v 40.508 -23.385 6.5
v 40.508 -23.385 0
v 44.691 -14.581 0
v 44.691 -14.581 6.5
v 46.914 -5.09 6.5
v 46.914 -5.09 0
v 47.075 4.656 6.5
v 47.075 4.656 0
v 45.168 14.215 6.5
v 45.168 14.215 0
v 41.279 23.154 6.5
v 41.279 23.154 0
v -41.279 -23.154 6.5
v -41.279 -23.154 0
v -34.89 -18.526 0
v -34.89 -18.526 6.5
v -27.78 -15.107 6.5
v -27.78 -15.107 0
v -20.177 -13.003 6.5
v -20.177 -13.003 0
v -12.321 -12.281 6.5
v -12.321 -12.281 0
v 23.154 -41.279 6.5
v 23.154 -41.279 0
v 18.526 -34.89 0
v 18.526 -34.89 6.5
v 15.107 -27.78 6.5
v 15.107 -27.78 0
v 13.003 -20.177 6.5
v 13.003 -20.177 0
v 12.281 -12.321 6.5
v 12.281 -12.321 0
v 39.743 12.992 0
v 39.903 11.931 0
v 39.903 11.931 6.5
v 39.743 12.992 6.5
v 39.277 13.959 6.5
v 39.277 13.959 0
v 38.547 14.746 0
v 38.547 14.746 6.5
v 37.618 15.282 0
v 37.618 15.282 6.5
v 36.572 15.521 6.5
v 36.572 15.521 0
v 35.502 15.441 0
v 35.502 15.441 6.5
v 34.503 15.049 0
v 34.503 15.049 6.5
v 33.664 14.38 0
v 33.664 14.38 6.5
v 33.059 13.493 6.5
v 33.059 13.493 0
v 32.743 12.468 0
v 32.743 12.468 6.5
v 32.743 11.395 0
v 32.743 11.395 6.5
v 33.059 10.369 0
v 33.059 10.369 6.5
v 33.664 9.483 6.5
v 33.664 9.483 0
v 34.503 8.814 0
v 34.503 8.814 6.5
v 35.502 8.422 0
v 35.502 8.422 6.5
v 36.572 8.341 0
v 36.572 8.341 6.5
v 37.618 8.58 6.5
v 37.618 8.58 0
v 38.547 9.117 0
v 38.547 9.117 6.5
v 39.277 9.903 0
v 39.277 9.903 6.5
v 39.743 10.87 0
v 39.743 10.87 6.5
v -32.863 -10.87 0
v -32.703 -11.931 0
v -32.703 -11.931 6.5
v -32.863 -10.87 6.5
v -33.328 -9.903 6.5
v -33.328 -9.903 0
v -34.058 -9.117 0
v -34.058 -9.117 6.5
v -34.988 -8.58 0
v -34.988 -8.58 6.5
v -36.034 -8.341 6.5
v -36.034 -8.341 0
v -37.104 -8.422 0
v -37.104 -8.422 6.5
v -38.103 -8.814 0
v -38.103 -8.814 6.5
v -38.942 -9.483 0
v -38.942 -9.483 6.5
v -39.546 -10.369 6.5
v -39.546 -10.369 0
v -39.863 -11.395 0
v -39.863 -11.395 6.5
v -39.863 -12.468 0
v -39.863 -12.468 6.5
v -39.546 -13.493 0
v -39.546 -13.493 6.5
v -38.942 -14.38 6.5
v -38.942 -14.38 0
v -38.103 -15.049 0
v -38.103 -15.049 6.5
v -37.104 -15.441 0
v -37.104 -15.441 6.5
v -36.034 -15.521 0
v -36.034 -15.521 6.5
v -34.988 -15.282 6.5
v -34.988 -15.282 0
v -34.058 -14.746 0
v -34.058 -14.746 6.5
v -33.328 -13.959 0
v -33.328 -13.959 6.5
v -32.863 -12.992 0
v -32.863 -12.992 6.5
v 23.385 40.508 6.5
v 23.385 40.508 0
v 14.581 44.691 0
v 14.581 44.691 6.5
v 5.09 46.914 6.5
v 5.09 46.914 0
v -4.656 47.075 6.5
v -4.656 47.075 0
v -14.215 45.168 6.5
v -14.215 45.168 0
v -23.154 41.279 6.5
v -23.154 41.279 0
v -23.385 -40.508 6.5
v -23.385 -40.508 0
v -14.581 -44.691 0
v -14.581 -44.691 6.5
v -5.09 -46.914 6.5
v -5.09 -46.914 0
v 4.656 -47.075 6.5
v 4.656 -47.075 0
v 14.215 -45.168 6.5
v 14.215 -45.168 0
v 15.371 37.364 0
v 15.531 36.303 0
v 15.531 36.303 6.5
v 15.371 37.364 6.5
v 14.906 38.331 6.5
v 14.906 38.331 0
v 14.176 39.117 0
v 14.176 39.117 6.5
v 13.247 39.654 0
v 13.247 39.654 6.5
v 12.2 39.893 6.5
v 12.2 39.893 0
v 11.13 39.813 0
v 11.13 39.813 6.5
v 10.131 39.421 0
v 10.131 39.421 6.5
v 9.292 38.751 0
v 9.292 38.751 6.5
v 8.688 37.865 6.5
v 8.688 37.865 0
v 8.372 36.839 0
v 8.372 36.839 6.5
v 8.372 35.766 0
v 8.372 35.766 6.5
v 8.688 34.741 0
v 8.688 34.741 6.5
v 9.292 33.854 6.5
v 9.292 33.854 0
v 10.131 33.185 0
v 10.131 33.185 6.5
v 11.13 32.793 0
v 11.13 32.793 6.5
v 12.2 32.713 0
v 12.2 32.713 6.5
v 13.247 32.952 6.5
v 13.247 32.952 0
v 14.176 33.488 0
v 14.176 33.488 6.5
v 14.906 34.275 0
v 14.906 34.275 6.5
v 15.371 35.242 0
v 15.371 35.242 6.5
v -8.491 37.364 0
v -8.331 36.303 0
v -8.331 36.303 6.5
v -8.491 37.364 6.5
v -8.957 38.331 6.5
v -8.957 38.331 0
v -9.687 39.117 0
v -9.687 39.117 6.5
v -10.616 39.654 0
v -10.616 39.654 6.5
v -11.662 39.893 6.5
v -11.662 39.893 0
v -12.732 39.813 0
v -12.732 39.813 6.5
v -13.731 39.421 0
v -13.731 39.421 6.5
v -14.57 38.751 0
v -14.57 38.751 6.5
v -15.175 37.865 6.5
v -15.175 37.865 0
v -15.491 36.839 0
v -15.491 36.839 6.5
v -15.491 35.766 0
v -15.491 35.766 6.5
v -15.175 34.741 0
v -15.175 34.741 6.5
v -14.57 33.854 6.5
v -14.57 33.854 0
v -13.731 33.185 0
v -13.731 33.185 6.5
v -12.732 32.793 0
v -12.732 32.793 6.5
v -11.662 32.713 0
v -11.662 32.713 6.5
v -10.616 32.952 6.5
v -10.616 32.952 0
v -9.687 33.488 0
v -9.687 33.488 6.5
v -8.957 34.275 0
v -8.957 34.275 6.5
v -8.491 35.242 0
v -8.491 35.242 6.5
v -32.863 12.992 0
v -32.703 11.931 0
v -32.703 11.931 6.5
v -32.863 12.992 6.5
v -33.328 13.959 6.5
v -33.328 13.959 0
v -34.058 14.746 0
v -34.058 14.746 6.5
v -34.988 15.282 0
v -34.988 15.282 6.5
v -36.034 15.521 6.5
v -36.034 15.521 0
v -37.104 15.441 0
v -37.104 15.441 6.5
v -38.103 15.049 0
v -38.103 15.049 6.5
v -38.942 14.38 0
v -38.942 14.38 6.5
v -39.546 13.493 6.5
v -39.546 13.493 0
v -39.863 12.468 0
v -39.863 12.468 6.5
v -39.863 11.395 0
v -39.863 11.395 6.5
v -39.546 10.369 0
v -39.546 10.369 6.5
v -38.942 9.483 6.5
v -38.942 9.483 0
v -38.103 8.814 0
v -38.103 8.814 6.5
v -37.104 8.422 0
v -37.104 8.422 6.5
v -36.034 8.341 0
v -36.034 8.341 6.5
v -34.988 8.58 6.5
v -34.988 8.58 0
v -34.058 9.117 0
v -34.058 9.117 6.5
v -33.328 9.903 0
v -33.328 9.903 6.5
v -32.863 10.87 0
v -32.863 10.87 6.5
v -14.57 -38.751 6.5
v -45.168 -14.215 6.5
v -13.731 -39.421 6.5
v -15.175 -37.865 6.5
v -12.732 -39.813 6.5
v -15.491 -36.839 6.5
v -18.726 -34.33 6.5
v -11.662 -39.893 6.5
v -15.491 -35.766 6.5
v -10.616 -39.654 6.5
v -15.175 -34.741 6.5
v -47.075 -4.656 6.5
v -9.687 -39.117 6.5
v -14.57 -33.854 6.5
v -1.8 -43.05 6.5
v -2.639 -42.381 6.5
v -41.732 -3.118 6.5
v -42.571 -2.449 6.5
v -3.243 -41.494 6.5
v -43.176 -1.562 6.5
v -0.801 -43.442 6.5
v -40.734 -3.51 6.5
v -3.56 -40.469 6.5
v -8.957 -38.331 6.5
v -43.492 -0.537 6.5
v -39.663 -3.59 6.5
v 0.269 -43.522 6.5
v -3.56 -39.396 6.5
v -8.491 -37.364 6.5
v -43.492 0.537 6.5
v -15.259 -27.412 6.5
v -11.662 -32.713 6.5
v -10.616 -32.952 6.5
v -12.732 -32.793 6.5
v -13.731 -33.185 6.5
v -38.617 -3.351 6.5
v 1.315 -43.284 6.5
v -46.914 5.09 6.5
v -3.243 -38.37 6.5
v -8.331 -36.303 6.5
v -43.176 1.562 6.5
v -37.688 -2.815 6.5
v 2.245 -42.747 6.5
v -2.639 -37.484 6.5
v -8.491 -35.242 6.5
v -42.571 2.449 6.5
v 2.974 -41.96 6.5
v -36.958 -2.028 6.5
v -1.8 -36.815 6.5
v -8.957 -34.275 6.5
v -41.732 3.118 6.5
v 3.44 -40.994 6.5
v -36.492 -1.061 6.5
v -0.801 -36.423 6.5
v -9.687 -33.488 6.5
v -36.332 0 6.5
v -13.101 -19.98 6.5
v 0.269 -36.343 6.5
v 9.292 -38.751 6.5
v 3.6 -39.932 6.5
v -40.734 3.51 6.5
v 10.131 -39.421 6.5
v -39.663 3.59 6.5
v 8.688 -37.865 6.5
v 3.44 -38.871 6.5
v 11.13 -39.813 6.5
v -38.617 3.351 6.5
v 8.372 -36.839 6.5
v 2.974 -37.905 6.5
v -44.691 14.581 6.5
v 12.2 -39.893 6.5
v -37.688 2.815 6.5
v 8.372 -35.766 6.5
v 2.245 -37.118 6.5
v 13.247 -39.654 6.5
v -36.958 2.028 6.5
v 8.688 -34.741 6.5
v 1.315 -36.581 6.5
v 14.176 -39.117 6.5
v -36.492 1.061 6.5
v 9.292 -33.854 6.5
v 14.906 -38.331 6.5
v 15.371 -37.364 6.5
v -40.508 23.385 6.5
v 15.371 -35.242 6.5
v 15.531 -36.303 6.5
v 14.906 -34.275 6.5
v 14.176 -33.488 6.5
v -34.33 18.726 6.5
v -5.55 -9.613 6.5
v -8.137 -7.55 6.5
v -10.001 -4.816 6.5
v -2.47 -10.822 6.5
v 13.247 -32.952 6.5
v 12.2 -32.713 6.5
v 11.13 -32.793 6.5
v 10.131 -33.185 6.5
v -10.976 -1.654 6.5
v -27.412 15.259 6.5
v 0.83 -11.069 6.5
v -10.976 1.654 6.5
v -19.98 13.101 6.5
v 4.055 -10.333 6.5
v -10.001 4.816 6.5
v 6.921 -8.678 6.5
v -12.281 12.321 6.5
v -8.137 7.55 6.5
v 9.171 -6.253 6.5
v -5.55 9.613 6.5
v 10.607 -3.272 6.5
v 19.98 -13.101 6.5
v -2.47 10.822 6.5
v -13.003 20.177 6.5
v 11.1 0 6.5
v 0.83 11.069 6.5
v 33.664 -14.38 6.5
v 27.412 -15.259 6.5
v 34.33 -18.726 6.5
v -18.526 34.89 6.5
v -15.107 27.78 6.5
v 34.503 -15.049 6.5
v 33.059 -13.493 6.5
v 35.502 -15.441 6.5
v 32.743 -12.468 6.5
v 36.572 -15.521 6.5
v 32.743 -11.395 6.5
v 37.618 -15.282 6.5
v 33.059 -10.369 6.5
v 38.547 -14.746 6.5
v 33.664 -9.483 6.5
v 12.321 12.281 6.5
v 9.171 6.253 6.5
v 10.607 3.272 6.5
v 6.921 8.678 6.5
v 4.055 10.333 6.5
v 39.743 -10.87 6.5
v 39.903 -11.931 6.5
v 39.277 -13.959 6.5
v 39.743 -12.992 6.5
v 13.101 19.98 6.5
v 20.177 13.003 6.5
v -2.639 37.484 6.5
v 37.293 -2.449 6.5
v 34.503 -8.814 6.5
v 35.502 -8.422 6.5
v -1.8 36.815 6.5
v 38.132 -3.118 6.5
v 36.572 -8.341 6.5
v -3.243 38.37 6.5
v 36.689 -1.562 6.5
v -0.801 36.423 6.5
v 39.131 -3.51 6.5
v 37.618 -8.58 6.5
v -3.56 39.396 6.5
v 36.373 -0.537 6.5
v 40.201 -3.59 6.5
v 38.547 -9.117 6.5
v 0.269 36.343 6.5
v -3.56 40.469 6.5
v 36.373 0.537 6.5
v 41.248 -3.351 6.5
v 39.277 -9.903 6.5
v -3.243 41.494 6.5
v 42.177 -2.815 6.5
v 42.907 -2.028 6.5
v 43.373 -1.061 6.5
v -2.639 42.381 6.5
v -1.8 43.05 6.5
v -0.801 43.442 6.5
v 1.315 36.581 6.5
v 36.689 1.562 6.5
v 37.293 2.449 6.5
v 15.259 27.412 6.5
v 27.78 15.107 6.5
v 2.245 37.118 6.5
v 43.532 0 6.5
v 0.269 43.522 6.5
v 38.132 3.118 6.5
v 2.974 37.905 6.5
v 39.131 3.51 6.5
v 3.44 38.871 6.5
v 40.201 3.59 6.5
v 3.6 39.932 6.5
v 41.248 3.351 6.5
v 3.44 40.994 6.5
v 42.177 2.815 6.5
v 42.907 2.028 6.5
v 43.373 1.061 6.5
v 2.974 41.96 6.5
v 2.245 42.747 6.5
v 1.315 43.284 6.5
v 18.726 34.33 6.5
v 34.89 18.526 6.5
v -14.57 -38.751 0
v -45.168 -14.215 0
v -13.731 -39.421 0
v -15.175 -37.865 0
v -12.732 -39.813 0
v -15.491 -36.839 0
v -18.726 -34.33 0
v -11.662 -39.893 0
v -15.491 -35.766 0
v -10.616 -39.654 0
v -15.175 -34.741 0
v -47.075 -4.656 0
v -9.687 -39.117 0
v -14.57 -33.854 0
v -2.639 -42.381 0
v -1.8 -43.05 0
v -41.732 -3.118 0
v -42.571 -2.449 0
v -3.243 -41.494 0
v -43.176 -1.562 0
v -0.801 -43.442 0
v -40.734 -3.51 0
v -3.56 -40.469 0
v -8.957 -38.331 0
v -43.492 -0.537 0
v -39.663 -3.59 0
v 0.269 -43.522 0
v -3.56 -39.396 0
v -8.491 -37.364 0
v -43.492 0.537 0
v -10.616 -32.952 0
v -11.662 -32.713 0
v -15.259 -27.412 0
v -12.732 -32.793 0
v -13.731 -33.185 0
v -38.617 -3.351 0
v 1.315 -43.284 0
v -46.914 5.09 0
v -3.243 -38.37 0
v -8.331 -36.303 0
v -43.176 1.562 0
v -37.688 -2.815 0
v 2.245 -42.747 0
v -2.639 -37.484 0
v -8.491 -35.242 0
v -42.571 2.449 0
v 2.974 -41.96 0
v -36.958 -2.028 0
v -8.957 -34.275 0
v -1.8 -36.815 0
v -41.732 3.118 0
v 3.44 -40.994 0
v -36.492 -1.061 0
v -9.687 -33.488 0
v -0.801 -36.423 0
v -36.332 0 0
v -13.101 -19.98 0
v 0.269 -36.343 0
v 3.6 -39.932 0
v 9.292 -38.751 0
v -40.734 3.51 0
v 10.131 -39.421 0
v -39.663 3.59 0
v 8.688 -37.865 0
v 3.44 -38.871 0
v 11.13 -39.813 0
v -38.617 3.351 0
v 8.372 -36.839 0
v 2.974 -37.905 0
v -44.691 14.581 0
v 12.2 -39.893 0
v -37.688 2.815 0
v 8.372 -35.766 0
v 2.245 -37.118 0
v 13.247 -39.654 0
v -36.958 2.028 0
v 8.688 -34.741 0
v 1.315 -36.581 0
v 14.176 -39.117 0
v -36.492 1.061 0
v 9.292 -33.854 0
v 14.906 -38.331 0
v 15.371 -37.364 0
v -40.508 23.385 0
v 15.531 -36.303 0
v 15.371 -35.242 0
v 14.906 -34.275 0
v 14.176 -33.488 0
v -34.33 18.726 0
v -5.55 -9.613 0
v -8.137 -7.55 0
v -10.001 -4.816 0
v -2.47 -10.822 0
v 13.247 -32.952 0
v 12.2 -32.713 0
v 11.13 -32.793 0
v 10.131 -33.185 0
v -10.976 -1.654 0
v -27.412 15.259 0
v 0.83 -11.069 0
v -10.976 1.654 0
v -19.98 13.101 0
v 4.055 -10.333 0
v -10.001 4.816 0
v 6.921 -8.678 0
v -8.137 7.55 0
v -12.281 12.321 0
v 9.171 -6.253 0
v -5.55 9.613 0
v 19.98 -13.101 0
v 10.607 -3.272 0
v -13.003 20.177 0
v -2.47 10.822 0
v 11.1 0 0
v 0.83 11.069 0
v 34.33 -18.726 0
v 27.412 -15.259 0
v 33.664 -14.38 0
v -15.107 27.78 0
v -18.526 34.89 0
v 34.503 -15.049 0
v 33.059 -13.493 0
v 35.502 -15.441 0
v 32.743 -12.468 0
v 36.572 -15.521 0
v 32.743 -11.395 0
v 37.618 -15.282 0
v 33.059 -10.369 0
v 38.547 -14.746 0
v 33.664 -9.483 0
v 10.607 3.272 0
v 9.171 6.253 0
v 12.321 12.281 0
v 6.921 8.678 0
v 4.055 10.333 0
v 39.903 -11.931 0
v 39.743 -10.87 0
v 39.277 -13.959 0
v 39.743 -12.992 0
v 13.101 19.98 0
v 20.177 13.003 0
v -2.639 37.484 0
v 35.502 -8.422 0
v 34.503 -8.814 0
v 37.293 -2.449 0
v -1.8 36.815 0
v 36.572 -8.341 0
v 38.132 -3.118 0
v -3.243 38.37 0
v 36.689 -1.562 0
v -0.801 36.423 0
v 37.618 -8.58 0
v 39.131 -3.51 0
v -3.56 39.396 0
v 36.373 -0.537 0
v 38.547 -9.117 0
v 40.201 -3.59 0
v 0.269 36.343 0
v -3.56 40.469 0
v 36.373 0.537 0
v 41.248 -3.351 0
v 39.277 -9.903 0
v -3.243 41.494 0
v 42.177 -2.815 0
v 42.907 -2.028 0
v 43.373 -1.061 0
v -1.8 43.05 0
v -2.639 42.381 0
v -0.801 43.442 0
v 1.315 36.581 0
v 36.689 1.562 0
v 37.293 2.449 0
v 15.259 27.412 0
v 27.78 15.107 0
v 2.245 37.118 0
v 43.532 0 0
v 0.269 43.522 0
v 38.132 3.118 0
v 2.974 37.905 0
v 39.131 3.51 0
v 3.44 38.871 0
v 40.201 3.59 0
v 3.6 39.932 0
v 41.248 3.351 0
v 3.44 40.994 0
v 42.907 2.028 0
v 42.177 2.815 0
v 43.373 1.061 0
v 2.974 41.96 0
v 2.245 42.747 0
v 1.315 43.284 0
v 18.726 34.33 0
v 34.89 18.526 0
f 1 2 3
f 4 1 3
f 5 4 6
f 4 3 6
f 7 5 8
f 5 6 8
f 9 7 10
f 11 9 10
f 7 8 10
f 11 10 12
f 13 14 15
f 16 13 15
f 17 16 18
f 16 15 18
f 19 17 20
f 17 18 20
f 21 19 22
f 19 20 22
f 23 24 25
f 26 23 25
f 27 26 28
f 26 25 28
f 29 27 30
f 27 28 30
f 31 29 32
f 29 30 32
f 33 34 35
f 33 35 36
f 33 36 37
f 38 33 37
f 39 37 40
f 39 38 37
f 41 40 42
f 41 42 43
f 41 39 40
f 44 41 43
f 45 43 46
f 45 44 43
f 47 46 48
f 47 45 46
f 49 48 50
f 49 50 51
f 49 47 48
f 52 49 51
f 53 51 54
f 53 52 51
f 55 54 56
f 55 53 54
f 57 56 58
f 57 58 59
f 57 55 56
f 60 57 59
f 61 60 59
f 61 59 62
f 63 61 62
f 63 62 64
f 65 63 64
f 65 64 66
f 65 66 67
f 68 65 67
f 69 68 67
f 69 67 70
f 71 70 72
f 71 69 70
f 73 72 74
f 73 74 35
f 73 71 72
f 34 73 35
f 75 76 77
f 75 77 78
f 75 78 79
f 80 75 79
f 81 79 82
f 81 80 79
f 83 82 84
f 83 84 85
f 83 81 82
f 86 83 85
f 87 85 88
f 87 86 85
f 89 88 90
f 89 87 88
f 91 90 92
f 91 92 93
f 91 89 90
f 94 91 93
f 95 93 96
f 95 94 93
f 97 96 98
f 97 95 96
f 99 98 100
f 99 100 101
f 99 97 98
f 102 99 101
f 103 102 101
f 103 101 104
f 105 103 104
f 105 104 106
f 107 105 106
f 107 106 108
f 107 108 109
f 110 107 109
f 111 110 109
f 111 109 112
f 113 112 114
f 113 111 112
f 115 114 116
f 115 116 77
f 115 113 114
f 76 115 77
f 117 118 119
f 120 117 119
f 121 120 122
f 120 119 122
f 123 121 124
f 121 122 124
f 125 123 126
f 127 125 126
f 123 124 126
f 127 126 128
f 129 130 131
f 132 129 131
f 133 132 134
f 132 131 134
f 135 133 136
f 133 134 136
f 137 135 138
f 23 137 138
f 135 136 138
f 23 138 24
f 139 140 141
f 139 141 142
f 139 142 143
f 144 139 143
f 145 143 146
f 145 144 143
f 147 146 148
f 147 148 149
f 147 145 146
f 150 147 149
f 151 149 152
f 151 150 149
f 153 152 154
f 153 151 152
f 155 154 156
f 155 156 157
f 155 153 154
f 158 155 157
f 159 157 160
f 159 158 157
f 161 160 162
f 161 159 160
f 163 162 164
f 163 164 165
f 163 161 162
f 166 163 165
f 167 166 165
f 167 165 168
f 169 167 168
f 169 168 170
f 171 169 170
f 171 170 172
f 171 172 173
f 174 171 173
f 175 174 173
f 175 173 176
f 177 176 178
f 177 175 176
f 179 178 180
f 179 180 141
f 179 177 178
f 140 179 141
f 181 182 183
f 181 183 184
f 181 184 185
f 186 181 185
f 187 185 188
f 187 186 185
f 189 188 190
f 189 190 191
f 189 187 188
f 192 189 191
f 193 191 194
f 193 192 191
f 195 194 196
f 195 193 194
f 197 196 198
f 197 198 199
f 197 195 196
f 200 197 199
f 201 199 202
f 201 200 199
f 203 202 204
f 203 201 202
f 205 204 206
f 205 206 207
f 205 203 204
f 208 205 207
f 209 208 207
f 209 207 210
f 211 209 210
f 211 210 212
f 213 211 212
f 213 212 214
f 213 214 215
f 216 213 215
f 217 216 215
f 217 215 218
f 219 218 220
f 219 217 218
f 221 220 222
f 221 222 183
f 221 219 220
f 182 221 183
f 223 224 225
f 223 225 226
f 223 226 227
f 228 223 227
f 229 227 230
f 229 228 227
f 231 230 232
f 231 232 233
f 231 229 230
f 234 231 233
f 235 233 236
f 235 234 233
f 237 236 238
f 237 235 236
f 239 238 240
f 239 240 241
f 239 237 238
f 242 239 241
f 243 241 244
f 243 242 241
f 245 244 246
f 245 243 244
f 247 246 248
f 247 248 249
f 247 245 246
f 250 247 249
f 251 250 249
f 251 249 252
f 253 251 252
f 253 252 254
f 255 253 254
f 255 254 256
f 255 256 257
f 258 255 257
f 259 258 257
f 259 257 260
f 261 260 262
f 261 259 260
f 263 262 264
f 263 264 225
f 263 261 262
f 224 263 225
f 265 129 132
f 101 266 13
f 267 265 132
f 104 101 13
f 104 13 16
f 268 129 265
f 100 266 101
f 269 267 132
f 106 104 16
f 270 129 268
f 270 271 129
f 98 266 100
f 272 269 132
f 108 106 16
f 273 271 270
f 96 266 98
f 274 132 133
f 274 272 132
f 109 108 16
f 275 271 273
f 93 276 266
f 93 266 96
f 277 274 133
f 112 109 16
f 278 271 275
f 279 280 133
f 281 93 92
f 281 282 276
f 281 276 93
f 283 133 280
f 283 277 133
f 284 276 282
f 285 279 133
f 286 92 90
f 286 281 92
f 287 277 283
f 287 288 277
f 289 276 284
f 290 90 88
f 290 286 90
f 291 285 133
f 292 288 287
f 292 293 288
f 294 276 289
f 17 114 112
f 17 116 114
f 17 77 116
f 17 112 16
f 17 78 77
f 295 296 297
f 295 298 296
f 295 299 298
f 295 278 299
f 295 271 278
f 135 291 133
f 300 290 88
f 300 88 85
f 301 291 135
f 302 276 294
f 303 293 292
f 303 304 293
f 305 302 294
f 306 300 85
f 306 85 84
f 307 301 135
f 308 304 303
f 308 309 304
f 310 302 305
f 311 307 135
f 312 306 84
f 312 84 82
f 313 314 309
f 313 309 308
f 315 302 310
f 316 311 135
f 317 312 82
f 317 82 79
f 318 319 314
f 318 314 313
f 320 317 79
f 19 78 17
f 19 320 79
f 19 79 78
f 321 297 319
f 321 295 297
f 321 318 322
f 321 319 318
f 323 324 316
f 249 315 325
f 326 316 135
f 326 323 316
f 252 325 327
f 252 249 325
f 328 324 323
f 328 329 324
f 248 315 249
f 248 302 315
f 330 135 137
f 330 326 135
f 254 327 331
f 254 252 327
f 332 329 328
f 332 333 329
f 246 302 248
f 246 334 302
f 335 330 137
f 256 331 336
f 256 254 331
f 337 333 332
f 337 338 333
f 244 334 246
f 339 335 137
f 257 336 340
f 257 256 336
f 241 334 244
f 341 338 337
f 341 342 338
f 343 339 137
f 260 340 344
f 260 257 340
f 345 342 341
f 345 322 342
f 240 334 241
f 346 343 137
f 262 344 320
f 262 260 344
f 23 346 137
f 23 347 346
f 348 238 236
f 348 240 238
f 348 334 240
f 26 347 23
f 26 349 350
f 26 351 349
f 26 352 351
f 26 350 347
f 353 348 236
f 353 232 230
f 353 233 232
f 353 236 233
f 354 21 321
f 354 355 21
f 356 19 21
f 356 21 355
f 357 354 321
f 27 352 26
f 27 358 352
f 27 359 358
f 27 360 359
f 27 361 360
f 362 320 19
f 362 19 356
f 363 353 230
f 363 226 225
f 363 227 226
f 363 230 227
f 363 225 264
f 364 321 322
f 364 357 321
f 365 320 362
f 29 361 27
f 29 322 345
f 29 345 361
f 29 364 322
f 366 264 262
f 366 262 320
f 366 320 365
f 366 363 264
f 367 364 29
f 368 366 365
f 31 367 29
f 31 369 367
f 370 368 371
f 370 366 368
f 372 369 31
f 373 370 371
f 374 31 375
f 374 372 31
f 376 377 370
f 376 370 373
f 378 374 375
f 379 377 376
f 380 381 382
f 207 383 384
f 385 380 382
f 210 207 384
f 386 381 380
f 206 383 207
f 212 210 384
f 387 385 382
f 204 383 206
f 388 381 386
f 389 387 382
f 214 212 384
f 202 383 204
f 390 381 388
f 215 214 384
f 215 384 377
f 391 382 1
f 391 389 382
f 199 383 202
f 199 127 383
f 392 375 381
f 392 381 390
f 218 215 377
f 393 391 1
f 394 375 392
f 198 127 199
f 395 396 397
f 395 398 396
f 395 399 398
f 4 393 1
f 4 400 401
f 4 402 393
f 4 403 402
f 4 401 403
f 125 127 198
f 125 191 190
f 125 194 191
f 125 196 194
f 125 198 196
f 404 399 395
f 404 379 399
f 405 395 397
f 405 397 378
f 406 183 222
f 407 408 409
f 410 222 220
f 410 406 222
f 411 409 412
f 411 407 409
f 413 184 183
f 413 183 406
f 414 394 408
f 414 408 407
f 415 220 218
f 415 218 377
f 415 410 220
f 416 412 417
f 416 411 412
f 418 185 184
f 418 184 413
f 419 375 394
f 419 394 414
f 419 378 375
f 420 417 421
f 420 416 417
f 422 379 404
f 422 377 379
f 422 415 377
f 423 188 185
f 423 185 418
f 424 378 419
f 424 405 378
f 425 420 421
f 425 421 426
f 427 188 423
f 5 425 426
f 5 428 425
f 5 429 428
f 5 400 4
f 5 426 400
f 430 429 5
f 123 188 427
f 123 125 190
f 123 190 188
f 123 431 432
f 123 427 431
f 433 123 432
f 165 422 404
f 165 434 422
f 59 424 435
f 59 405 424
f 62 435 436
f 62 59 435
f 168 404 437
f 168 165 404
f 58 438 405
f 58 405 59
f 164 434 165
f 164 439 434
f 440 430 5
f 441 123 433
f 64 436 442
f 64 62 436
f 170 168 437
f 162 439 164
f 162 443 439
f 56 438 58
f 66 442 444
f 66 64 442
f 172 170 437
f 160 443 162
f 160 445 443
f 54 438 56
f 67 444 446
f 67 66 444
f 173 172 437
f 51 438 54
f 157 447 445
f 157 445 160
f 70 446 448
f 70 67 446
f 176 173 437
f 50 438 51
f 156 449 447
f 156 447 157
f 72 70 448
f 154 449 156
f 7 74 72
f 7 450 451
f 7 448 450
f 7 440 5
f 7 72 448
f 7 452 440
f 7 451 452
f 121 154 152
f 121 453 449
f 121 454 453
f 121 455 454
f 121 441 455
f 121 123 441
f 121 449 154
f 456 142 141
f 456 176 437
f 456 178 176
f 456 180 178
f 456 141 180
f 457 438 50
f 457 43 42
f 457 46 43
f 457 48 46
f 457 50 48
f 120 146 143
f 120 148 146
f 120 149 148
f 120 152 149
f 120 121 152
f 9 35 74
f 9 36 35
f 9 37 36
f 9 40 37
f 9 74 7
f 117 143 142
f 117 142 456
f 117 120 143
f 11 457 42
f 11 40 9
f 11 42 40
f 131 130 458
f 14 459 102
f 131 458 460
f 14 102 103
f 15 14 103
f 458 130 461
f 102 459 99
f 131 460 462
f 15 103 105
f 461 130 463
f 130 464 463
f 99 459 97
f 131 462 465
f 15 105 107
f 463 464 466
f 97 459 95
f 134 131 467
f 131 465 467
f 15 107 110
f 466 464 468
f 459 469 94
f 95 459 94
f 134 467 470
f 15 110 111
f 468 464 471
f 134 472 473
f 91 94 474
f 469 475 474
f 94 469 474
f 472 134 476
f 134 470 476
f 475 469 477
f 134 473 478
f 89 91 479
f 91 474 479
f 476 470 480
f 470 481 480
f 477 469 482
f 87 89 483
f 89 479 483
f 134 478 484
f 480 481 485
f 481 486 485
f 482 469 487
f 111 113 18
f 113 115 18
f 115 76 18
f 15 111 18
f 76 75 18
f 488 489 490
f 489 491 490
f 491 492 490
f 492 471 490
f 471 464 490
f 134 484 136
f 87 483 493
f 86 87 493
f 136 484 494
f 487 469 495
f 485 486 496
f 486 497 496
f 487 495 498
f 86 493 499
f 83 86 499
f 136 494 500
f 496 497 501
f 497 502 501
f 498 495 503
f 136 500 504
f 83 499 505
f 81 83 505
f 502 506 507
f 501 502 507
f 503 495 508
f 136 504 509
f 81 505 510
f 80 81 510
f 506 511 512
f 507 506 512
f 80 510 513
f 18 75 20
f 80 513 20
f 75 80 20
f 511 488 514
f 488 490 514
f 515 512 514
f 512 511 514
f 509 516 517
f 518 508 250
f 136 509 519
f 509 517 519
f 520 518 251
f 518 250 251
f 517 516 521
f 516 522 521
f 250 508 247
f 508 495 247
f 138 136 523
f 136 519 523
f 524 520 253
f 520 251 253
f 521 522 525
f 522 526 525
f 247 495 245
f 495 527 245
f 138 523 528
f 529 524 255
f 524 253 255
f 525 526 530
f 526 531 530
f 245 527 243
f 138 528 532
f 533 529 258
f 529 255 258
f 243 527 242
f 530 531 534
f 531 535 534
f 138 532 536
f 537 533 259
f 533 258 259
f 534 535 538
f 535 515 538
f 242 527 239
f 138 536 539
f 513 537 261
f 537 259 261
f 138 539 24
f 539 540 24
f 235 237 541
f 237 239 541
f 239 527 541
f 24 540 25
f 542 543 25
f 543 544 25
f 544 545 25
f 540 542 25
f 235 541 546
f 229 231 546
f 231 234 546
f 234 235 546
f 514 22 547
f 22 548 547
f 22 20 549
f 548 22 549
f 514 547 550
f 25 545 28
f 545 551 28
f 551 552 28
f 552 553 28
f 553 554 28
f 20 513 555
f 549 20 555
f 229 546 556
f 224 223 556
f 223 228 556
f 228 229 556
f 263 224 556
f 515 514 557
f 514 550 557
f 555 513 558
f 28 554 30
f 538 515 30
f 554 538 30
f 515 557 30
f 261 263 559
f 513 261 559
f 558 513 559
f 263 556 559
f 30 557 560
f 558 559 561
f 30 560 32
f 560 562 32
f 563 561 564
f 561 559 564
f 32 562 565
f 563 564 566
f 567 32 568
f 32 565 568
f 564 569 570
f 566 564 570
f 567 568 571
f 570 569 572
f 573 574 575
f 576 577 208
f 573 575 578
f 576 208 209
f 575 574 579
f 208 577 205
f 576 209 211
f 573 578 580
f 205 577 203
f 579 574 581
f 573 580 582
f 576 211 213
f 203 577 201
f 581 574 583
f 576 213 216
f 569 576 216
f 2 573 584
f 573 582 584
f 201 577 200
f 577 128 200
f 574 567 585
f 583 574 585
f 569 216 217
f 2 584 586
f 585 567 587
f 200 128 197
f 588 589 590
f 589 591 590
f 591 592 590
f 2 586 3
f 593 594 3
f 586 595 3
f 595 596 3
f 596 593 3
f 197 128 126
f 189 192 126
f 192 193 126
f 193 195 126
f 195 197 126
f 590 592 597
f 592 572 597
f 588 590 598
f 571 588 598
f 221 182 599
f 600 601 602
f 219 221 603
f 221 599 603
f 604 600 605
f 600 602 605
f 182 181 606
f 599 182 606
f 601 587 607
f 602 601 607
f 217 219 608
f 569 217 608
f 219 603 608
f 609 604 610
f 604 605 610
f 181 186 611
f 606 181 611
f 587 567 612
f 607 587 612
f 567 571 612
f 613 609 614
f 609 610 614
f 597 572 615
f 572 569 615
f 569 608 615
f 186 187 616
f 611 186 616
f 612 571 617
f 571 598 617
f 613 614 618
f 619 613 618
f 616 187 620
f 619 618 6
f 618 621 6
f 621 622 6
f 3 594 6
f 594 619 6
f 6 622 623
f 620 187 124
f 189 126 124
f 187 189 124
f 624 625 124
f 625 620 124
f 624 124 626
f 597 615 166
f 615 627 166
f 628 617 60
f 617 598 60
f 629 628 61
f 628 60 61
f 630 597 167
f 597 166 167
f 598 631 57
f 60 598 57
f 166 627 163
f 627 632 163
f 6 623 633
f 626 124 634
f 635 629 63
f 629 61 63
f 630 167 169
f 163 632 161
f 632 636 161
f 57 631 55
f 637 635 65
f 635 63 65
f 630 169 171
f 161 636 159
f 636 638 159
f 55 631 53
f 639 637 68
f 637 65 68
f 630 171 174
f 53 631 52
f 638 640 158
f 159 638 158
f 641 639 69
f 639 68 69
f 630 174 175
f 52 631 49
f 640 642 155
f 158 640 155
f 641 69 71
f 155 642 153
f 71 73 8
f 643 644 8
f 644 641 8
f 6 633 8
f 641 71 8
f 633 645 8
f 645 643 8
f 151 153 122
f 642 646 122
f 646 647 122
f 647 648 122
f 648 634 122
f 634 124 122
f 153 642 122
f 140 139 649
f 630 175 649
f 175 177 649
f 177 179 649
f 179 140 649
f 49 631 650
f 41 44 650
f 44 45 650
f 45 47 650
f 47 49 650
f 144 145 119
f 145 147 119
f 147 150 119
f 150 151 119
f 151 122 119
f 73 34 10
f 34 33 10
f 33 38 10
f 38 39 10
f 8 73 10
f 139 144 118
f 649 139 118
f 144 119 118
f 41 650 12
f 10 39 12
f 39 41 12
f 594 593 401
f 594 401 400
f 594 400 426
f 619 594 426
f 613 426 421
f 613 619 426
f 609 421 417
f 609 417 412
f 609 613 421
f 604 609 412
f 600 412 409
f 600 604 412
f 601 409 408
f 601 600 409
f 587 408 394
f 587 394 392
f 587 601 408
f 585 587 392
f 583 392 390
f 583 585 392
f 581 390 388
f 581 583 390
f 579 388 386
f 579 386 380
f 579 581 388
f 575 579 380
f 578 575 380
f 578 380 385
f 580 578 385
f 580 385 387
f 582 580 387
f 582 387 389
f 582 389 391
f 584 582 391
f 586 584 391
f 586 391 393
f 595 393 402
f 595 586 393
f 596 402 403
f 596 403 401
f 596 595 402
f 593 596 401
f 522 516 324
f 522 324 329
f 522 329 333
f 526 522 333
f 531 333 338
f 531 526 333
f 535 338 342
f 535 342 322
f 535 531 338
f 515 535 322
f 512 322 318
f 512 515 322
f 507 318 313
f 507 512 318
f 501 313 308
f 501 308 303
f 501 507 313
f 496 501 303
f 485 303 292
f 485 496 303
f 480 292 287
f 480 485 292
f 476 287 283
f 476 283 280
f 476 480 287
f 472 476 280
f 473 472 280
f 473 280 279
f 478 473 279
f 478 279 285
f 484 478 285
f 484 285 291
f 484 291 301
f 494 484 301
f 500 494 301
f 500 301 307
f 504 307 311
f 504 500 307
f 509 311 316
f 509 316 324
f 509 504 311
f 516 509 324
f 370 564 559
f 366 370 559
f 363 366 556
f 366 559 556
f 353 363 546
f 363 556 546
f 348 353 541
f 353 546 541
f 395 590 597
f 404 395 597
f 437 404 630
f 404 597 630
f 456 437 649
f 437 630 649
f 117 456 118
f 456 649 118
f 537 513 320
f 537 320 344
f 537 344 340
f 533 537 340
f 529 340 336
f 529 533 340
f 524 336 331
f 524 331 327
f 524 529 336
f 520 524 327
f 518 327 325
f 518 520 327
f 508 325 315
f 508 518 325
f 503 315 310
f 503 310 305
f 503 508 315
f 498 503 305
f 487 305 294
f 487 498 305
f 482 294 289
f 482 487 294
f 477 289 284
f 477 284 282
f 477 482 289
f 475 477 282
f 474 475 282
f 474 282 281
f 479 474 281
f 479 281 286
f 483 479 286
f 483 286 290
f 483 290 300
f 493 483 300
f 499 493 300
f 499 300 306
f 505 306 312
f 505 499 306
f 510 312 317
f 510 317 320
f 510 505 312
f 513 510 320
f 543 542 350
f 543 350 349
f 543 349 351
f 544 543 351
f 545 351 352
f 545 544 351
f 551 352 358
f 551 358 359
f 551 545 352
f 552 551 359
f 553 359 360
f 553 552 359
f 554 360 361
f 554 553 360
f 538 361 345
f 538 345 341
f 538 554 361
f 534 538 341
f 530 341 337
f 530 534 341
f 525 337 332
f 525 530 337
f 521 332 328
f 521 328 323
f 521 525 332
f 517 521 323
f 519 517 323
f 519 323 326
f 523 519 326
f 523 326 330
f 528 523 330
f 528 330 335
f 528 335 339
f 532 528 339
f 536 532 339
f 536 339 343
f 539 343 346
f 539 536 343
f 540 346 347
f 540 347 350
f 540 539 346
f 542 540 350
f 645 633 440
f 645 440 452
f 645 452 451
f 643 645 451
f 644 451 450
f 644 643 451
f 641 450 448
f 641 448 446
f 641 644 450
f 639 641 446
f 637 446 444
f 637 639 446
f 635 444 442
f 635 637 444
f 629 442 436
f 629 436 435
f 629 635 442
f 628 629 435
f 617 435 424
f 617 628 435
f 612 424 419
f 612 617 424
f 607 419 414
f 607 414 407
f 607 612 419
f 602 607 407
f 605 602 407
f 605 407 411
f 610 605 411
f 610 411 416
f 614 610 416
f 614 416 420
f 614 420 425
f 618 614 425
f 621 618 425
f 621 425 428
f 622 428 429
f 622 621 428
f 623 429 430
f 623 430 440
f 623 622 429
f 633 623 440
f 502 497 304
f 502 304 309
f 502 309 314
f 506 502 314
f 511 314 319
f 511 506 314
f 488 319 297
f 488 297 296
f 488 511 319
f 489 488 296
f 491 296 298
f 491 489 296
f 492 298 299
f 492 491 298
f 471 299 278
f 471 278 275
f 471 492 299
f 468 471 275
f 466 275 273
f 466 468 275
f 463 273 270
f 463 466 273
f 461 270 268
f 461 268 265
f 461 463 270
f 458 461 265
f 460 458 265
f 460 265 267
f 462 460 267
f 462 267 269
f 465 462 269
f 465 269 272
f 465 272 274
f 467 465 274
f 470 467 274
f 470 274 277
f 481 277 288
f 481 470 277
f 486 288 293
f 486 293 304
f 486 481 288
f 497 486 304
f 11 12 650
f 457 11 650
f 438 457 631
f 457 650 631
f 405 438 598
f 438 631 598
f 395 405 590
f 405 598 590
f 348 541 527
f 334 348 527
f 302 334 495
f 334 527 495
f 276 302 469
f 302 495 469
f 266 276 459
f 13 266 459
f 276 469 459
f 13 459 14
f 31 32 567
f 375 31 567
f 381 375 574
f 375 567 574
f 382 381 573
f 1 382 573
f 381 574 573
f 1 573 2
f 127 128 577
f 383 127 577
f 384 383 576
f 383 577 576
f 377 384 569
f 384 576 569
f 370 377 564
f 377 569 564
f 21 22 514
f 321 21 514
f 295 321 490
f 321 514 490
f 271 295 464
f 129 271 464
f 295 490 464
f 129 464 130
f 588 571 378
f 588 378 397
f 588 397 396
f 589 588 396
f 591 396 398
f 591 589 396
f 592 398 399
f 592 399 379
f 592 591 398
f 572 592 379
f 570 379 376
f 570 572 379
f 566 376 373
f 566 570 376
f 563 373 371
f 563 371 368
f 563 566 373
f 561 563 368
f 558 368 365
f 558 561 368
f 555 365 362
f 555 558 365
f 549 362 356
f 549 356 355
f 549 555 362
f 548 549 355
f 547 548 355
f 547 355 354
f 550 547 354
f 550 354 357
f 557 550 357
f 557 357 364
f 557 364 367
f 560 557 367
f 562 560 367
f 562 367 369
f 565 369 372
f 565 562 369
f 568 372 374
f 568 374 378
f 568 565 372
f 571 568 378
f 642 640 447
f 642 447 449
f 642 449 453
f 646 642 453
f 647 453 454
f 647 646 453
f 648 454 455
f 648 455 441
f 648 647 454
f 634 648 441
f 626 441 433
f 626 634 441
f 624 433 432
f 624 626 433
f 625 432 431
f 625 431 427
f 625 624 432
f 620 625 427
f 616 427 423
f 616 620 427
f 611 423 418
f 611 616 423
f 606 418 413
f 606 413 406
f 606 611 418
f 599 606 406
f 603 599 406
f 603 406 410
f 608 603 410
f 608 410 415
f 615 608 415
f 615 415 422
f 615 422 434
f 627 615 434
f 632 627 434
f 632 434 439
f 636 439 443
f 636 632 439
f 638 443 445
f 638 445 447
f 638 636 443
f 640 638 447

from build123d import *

# Parameters (mm, degrees)
F0_R     = 3.6
F0_R_2   = 11.1
F1_DEPTH = 6.5


with BuildPart() as f1:
    # F0 (on Top) → F1 (new body)
    with BuildSketch(Plane.XY):
        with BuildLine():
            ThreePointArc((12.7551052803, 5.7712467707), (13.2775282625, 2.8640474895), (14, 0))
            ThreePointArc((14, 0), (13.6852379213, 2.951993062), (12.7551052803, 5.7712467707))
        make_face()
        with BuildLine():
            ThreePointArc((12.7551052803, 5.7712467707), (13.6852379213, 2.951993062), (14, 0))
            ThreePointArc((14, 0), (13.6843771554, -2.9559806947), (12.7517397332, -5.7786792415))
            ThreePointArc((12.7517397332, -5.7786792415), (12.3951684194, -9.0411992807), (12.2812401035, -12.3211688608))
            ThreePointArc((12.2812401035, -12.3211688608), (27.4116387343, -15.2593204889), (40.5084826052, -23.3854744583))
            ThreePointArc((40.5084826052, -23.3854744583), (47.2547330266, -0.2211970993), (41.2789992988, 23.1537092477))
            ThreePointArc((41.2789992988, 23.1537092477), (27.7803945414, 15.1065071257), (12.3211688608, 12.2812401035))
            ThreePointArc((12.3211688608, 12.2812401035), (12.4134187433, 9.0179300915), (12.7551052803, 5.7712467707))
        make_face()
        with Locations((36.3028572677, -11.9313535626)):
            Circle(F0_R, mode=Mode.SUBTRACT)
        with Locations((39.9324558712, 0)):
            Circle(F0_R, mode=Mode.SUBTRACT)
        with Locations((36.3028572677, 11.9313535626)):
            Circle(F0_R, mode=Mode.SUBTRACT)
        with BuildLine():
            ThreePointArc((12.7517397332, -5.7786792415), (13.2793138092, -2.8684824171), (14, 0))
            ThreePointArc((14, 0), (13.2775282625, 2.8640474895), (12.7551052803, 5.7712467707))
            ThreePointArc((12.7551052803, 5.7712467707), (9.9023791422, 9.8966098905), (5.7786792415, 12.7517397332))
            ThreePointArc((5.7786792415, 12.7517397332), (2.8684824171, 13.2793138092), (0, 14))
            ThreePointArc((0, 14), (-2.8640474895, 13.2775282625), (-5.7712467707, 12.7551052803))
            ThreePointArc((-5.7712467707, 12.7551052803), (-9.8966098905, 9.9023791422), (-12.7517397332, 5.7786792415))
            ThreePointArc((-12.7517397332, 5.7786792415), (-13.2793138092, 2.8684824171), (-14, 0))
            ThreePointArc((-14, 0), (-13.2775282625, -2.8640474895), (-12.7551052803, -5.7712467707))
            ThreePointArc((-12.7551052803, -5.7712467707), (-9.9023791422, -9.8966098905), (-5.7786792415, -12.7517397332))
            ThreePointArc((-5.7786792415, -12.7517397332), (-2.8684824171, -13.2793138092), (0, -14))
            ThreePointArc((0, -14), (2.8640474895, -13.2775282625), (5.7712467707, -12.7551052803))
            ThreePointArc((5.7712467707, -12.7551052803), (9.8966098905, -9.9023791422), (12.7517397332, -5.7786792415))
        make_face()
        Circle(F0_R_2, mode=Mode.SUBTRACT)
        with BuildLine():
            ThreePointArc((12.7517397332, -5.7786792415), (13.6843771554, -2.9559806947), (14, 0))
            ThreePointArc((14, 0), (13.2793138092, -2.8684824171), (12.7517397332, -5.7786792415))
        make_face()
        with BuildLine():
            ThreePointArc((5.7786792415, 12.7517397332), (9.9023791422, 9.8966098905), (12.7551052803, 5.7712467707))
            ThreePointArc((12.7551052803, 5.7712467707), (12.4134187433, 9.0179300915), (12.3211688608, 12.2812401035))
            ThreePointArc((12.3211688608, 12.2812401035), (9.0411992807, 12.3951684194), (5.7786792415, 12.7517397332))
        make_face()
        with BuildLine():
            ThreePointArc((12.2812401035, -12.3211688608), (12.3951684194, -9.0411992807), (12.7517397332, -5.7786792415))
            ThreePointArc((12.7517397332, -5.7786792415), (9.8966098905, -9.9023791422), (5.7712467707, -12.7551052803))
            ThreePointArc((5.7712467707, -12.7551052803), (9.0179300915, -12.4134187433), (12.2812401035, -12.3211688608))
        make_face()
        with BuildLine():
            ThreePointArc((0, 14), (2.8684824171, 13.2793138092), (5.7786792415, 12.7517397332))
            ThreePointArc((5.7786792415, 12.7517397332), (2.9559806947, 13.6843771554), (0, 14))
        make_face()
        with BuildLine():
            ThreePointArc((0, 14), (2.9559806947, 13.6843771554), (5.7786792415, 12.7517397332))
            ThreePointArc((5.7786792415, 12.7517397332), (9.0411992807, 12.3951684194), (12.3211688608, 12.2812401035))
            ThreePointArc((12.3211688608, 12.2812401035), (15.2593204889, 27.4116387343), (23.3854744583, 40.5084826052))
            ThreePointArc((23.3854744583, 40.5084826052), (0.2211970993, 47.2547330266), (-23.1537092477, 41.2789992988))
            ThreePointArc((-23.1537092477, 41.2789992988), (-15.1065071257, 27.7803945414), (-12.2812401035, 12.3211688608))
            ThreePointArc((-12.2812401035, 12.3211688608), (-9.0179300915, 12.4134187433), (-5.7712467707, 12.7551052803))
            ThreePointArc((-5.7712467707, 12.7551052803), (-2.951993062, 13.6852379213), (0, 14))
        make_face()
        with Locations((-11.9313535626, 36.3028572677)):
            Circle(F0_R, mode=Mode.SUBTRACT)
        with Locations((0, 39.9324558712)):
            Circle(F0_R, mode=Mode.SUBTRACT)
        with Locations((11.9313535626, 36.3028572677)):
            Circle(F0_R, mode=Mode.SUBTRACT)
        with BuildLine():
            ThreePointArc((12.2812401035, -12.3211688608), (9.0179300915, -12.4134187433), (5.7712467707, -12.7551052803))
            ThreePointArc((5.7712467707, -12.7551052803), (2.951993062, -13.6852379213), (0, -14))
            ThreePointArc((0, -14), (-2.9559806947, -13.6843771554), (-5.7786792415, -12.7517397332))
            ThreePointArc((-5.7786792415, -12.7517397332), (-9.0411992807, -12.3951684194), (-12.3211688608, -12.2812401035))
            ThreePointArc((-12.3211688608, -12.2812401035), (-15.2593204889, -27.4116387343), (-23.3854744583, -40.5084826052))
            ThreePointArc((-23.3854744583, -40.5084826052), (-0.2211970993, -47.2547330266), (23.1537092477, -41.2789992988))
            ThreePointArc((23.1537092477, -41.2789992988), (15.1065071257, -27.7803945414), (12.2812401035, -12.3211688608))
        make_face()
        with Locations((-11.9313535626, -36.3028572677)):
            Circle(F0_R, mode=Mode.SUBTRACT)
        with Locations((0, -39.9324558712)):
            Circle(F0_R, mode=Mode.SUBTRACT)
        with Locations((11.9313535626, -36.3028572677)):
            Circle(F0_R, mode=Mode.SUBTRACT)
        with BuildLine():
            ThreePointArc((0, -14), (2.951993062, -13.6852379213), (5.7712467707, -12.7551052803))
            ThreePointArc((5.7712467707, -12.7551052803), (2.8640474895, -13.2775282625), (0, -14))
        make_face()
        with BuildLine():
            ThreePointArc((-5.7712467707, 12.7551052803), (-2.8640474895, 13.2775282625), (0, 14))
            ThreePointArc((0, 14), (-2.951993062, 13.6852379213), (-5.7712467707, 12.7551052803))
        make_face()
        with BuildLine():
            ThreePointArc((-5.7786792415, -12.7517397332), (-2.9559806947, -13.6843771554), (0, -14))
            ThreePointArc((0, -14), (-2.8684824171, -13.2793138092), (-5.7786792415, -12.7517397332))
        make_face()
        with BuildLine():
            ThreePointArc((-12.7517397332, 5.7786792415), (-9.8966098905, 9.9023791422), (-5.7712467707, 12.7551052803))
            ThreePointArc((-5.7712467707, 12.7551052803), (-9.0179300915, 12.4134187433), (-12.2812401035, 12.3211688608))
            ThreePointArc((-12.2812401035, 12.3211688608), (-12.3951684194, 9.0411992807), (-12.7517397332, 5.7786792415))
        make_face()
        with BuildLine():
            ThreePointArc((-12.3211688608, -12.2812401035), (-9.0411992807, -12.3951684194), (-5.7786792415, -12.7517397332))
            ThreePointArc((-5.7786792415, -12.7517397332), (-9.9023791422, -9.8966098905), (-12.7551052803, -5.7712467707))
            ThreePointArc((-12.7551052803, -5.7712467707), (-12.4134187433, -9.0179300915), (-12.3211688608, -12.2812401035))
        make_face()
        with BuildLine():
            ThreePointArc((-14, 0), (-13.2793138092, 2.8684824171), (-12.7517397332, 5.7786792415))
            ThreePointArc((-12.7517397332, 5.7786792415), (-13.6843771554, 2.9559806947), (-14, 0))
        make_face()
        with BuildLine():
            ThreePointArc((-14, 0), (-13.6843771554, 2.9559806947), (-12.7517397332, 5.7786792415))
            ThreePointArc((-12.7517397332, 5.7786792415), (-12.3951684194, 9.0411992807), (-12.2812401035, 12.3211688608))
            ThreePointArc((-12.2812401035, 12.3211688608), (-27.4116387343, 15.2593204889), (-40.5084826052, 23.3854744583))
            ThreePointArc((-40.5084826052, 23.3854744583), (-47.2547330266, 0.2211970993), (-41.2789992988, -23.1537092477))
            ThreePointArc((-41.2789992988, -23.1537092477), (-27.7803945414, -15.1065071257), (-12.3211688608, -12.2812401035))
            ThreePointArc((-12.3211688608, -12.2812401035), (-12.4134187433, -9.0179300915), (-12.7551052803, -5.7712467707))
            ThreePointArc((-12.7551052803, -5.7712467707), (-13.6852379213, -2.951993062), (-14, 0))
        make_face()
        with Locations((-36.3028572677, -11.9313535626)):
            Circle(F0_R, mode=Mode.SUBTRACT)
        with Locations((-39.9324558712, 0)):
            Circle(F0_R, mode=Mode.SUBTRACT)
        with Locations((-36.3028572677, 11.9313535626)):
            Circle(F0_R, mode=Mode.SUBTRACT)
        with BuildLine():
            ThreePointArc((-14, 0), (-13.6852379213, -2.951993062), (-12.7551052803, -5.7712467707))
            ThreePointArc((-12.7551052803, -5.7712467707), (-13.2775282625, -2.8640474895), (-14, 0))
        make_face()
    extrude(amount=F1_DEPTH)


solid = f1.part
